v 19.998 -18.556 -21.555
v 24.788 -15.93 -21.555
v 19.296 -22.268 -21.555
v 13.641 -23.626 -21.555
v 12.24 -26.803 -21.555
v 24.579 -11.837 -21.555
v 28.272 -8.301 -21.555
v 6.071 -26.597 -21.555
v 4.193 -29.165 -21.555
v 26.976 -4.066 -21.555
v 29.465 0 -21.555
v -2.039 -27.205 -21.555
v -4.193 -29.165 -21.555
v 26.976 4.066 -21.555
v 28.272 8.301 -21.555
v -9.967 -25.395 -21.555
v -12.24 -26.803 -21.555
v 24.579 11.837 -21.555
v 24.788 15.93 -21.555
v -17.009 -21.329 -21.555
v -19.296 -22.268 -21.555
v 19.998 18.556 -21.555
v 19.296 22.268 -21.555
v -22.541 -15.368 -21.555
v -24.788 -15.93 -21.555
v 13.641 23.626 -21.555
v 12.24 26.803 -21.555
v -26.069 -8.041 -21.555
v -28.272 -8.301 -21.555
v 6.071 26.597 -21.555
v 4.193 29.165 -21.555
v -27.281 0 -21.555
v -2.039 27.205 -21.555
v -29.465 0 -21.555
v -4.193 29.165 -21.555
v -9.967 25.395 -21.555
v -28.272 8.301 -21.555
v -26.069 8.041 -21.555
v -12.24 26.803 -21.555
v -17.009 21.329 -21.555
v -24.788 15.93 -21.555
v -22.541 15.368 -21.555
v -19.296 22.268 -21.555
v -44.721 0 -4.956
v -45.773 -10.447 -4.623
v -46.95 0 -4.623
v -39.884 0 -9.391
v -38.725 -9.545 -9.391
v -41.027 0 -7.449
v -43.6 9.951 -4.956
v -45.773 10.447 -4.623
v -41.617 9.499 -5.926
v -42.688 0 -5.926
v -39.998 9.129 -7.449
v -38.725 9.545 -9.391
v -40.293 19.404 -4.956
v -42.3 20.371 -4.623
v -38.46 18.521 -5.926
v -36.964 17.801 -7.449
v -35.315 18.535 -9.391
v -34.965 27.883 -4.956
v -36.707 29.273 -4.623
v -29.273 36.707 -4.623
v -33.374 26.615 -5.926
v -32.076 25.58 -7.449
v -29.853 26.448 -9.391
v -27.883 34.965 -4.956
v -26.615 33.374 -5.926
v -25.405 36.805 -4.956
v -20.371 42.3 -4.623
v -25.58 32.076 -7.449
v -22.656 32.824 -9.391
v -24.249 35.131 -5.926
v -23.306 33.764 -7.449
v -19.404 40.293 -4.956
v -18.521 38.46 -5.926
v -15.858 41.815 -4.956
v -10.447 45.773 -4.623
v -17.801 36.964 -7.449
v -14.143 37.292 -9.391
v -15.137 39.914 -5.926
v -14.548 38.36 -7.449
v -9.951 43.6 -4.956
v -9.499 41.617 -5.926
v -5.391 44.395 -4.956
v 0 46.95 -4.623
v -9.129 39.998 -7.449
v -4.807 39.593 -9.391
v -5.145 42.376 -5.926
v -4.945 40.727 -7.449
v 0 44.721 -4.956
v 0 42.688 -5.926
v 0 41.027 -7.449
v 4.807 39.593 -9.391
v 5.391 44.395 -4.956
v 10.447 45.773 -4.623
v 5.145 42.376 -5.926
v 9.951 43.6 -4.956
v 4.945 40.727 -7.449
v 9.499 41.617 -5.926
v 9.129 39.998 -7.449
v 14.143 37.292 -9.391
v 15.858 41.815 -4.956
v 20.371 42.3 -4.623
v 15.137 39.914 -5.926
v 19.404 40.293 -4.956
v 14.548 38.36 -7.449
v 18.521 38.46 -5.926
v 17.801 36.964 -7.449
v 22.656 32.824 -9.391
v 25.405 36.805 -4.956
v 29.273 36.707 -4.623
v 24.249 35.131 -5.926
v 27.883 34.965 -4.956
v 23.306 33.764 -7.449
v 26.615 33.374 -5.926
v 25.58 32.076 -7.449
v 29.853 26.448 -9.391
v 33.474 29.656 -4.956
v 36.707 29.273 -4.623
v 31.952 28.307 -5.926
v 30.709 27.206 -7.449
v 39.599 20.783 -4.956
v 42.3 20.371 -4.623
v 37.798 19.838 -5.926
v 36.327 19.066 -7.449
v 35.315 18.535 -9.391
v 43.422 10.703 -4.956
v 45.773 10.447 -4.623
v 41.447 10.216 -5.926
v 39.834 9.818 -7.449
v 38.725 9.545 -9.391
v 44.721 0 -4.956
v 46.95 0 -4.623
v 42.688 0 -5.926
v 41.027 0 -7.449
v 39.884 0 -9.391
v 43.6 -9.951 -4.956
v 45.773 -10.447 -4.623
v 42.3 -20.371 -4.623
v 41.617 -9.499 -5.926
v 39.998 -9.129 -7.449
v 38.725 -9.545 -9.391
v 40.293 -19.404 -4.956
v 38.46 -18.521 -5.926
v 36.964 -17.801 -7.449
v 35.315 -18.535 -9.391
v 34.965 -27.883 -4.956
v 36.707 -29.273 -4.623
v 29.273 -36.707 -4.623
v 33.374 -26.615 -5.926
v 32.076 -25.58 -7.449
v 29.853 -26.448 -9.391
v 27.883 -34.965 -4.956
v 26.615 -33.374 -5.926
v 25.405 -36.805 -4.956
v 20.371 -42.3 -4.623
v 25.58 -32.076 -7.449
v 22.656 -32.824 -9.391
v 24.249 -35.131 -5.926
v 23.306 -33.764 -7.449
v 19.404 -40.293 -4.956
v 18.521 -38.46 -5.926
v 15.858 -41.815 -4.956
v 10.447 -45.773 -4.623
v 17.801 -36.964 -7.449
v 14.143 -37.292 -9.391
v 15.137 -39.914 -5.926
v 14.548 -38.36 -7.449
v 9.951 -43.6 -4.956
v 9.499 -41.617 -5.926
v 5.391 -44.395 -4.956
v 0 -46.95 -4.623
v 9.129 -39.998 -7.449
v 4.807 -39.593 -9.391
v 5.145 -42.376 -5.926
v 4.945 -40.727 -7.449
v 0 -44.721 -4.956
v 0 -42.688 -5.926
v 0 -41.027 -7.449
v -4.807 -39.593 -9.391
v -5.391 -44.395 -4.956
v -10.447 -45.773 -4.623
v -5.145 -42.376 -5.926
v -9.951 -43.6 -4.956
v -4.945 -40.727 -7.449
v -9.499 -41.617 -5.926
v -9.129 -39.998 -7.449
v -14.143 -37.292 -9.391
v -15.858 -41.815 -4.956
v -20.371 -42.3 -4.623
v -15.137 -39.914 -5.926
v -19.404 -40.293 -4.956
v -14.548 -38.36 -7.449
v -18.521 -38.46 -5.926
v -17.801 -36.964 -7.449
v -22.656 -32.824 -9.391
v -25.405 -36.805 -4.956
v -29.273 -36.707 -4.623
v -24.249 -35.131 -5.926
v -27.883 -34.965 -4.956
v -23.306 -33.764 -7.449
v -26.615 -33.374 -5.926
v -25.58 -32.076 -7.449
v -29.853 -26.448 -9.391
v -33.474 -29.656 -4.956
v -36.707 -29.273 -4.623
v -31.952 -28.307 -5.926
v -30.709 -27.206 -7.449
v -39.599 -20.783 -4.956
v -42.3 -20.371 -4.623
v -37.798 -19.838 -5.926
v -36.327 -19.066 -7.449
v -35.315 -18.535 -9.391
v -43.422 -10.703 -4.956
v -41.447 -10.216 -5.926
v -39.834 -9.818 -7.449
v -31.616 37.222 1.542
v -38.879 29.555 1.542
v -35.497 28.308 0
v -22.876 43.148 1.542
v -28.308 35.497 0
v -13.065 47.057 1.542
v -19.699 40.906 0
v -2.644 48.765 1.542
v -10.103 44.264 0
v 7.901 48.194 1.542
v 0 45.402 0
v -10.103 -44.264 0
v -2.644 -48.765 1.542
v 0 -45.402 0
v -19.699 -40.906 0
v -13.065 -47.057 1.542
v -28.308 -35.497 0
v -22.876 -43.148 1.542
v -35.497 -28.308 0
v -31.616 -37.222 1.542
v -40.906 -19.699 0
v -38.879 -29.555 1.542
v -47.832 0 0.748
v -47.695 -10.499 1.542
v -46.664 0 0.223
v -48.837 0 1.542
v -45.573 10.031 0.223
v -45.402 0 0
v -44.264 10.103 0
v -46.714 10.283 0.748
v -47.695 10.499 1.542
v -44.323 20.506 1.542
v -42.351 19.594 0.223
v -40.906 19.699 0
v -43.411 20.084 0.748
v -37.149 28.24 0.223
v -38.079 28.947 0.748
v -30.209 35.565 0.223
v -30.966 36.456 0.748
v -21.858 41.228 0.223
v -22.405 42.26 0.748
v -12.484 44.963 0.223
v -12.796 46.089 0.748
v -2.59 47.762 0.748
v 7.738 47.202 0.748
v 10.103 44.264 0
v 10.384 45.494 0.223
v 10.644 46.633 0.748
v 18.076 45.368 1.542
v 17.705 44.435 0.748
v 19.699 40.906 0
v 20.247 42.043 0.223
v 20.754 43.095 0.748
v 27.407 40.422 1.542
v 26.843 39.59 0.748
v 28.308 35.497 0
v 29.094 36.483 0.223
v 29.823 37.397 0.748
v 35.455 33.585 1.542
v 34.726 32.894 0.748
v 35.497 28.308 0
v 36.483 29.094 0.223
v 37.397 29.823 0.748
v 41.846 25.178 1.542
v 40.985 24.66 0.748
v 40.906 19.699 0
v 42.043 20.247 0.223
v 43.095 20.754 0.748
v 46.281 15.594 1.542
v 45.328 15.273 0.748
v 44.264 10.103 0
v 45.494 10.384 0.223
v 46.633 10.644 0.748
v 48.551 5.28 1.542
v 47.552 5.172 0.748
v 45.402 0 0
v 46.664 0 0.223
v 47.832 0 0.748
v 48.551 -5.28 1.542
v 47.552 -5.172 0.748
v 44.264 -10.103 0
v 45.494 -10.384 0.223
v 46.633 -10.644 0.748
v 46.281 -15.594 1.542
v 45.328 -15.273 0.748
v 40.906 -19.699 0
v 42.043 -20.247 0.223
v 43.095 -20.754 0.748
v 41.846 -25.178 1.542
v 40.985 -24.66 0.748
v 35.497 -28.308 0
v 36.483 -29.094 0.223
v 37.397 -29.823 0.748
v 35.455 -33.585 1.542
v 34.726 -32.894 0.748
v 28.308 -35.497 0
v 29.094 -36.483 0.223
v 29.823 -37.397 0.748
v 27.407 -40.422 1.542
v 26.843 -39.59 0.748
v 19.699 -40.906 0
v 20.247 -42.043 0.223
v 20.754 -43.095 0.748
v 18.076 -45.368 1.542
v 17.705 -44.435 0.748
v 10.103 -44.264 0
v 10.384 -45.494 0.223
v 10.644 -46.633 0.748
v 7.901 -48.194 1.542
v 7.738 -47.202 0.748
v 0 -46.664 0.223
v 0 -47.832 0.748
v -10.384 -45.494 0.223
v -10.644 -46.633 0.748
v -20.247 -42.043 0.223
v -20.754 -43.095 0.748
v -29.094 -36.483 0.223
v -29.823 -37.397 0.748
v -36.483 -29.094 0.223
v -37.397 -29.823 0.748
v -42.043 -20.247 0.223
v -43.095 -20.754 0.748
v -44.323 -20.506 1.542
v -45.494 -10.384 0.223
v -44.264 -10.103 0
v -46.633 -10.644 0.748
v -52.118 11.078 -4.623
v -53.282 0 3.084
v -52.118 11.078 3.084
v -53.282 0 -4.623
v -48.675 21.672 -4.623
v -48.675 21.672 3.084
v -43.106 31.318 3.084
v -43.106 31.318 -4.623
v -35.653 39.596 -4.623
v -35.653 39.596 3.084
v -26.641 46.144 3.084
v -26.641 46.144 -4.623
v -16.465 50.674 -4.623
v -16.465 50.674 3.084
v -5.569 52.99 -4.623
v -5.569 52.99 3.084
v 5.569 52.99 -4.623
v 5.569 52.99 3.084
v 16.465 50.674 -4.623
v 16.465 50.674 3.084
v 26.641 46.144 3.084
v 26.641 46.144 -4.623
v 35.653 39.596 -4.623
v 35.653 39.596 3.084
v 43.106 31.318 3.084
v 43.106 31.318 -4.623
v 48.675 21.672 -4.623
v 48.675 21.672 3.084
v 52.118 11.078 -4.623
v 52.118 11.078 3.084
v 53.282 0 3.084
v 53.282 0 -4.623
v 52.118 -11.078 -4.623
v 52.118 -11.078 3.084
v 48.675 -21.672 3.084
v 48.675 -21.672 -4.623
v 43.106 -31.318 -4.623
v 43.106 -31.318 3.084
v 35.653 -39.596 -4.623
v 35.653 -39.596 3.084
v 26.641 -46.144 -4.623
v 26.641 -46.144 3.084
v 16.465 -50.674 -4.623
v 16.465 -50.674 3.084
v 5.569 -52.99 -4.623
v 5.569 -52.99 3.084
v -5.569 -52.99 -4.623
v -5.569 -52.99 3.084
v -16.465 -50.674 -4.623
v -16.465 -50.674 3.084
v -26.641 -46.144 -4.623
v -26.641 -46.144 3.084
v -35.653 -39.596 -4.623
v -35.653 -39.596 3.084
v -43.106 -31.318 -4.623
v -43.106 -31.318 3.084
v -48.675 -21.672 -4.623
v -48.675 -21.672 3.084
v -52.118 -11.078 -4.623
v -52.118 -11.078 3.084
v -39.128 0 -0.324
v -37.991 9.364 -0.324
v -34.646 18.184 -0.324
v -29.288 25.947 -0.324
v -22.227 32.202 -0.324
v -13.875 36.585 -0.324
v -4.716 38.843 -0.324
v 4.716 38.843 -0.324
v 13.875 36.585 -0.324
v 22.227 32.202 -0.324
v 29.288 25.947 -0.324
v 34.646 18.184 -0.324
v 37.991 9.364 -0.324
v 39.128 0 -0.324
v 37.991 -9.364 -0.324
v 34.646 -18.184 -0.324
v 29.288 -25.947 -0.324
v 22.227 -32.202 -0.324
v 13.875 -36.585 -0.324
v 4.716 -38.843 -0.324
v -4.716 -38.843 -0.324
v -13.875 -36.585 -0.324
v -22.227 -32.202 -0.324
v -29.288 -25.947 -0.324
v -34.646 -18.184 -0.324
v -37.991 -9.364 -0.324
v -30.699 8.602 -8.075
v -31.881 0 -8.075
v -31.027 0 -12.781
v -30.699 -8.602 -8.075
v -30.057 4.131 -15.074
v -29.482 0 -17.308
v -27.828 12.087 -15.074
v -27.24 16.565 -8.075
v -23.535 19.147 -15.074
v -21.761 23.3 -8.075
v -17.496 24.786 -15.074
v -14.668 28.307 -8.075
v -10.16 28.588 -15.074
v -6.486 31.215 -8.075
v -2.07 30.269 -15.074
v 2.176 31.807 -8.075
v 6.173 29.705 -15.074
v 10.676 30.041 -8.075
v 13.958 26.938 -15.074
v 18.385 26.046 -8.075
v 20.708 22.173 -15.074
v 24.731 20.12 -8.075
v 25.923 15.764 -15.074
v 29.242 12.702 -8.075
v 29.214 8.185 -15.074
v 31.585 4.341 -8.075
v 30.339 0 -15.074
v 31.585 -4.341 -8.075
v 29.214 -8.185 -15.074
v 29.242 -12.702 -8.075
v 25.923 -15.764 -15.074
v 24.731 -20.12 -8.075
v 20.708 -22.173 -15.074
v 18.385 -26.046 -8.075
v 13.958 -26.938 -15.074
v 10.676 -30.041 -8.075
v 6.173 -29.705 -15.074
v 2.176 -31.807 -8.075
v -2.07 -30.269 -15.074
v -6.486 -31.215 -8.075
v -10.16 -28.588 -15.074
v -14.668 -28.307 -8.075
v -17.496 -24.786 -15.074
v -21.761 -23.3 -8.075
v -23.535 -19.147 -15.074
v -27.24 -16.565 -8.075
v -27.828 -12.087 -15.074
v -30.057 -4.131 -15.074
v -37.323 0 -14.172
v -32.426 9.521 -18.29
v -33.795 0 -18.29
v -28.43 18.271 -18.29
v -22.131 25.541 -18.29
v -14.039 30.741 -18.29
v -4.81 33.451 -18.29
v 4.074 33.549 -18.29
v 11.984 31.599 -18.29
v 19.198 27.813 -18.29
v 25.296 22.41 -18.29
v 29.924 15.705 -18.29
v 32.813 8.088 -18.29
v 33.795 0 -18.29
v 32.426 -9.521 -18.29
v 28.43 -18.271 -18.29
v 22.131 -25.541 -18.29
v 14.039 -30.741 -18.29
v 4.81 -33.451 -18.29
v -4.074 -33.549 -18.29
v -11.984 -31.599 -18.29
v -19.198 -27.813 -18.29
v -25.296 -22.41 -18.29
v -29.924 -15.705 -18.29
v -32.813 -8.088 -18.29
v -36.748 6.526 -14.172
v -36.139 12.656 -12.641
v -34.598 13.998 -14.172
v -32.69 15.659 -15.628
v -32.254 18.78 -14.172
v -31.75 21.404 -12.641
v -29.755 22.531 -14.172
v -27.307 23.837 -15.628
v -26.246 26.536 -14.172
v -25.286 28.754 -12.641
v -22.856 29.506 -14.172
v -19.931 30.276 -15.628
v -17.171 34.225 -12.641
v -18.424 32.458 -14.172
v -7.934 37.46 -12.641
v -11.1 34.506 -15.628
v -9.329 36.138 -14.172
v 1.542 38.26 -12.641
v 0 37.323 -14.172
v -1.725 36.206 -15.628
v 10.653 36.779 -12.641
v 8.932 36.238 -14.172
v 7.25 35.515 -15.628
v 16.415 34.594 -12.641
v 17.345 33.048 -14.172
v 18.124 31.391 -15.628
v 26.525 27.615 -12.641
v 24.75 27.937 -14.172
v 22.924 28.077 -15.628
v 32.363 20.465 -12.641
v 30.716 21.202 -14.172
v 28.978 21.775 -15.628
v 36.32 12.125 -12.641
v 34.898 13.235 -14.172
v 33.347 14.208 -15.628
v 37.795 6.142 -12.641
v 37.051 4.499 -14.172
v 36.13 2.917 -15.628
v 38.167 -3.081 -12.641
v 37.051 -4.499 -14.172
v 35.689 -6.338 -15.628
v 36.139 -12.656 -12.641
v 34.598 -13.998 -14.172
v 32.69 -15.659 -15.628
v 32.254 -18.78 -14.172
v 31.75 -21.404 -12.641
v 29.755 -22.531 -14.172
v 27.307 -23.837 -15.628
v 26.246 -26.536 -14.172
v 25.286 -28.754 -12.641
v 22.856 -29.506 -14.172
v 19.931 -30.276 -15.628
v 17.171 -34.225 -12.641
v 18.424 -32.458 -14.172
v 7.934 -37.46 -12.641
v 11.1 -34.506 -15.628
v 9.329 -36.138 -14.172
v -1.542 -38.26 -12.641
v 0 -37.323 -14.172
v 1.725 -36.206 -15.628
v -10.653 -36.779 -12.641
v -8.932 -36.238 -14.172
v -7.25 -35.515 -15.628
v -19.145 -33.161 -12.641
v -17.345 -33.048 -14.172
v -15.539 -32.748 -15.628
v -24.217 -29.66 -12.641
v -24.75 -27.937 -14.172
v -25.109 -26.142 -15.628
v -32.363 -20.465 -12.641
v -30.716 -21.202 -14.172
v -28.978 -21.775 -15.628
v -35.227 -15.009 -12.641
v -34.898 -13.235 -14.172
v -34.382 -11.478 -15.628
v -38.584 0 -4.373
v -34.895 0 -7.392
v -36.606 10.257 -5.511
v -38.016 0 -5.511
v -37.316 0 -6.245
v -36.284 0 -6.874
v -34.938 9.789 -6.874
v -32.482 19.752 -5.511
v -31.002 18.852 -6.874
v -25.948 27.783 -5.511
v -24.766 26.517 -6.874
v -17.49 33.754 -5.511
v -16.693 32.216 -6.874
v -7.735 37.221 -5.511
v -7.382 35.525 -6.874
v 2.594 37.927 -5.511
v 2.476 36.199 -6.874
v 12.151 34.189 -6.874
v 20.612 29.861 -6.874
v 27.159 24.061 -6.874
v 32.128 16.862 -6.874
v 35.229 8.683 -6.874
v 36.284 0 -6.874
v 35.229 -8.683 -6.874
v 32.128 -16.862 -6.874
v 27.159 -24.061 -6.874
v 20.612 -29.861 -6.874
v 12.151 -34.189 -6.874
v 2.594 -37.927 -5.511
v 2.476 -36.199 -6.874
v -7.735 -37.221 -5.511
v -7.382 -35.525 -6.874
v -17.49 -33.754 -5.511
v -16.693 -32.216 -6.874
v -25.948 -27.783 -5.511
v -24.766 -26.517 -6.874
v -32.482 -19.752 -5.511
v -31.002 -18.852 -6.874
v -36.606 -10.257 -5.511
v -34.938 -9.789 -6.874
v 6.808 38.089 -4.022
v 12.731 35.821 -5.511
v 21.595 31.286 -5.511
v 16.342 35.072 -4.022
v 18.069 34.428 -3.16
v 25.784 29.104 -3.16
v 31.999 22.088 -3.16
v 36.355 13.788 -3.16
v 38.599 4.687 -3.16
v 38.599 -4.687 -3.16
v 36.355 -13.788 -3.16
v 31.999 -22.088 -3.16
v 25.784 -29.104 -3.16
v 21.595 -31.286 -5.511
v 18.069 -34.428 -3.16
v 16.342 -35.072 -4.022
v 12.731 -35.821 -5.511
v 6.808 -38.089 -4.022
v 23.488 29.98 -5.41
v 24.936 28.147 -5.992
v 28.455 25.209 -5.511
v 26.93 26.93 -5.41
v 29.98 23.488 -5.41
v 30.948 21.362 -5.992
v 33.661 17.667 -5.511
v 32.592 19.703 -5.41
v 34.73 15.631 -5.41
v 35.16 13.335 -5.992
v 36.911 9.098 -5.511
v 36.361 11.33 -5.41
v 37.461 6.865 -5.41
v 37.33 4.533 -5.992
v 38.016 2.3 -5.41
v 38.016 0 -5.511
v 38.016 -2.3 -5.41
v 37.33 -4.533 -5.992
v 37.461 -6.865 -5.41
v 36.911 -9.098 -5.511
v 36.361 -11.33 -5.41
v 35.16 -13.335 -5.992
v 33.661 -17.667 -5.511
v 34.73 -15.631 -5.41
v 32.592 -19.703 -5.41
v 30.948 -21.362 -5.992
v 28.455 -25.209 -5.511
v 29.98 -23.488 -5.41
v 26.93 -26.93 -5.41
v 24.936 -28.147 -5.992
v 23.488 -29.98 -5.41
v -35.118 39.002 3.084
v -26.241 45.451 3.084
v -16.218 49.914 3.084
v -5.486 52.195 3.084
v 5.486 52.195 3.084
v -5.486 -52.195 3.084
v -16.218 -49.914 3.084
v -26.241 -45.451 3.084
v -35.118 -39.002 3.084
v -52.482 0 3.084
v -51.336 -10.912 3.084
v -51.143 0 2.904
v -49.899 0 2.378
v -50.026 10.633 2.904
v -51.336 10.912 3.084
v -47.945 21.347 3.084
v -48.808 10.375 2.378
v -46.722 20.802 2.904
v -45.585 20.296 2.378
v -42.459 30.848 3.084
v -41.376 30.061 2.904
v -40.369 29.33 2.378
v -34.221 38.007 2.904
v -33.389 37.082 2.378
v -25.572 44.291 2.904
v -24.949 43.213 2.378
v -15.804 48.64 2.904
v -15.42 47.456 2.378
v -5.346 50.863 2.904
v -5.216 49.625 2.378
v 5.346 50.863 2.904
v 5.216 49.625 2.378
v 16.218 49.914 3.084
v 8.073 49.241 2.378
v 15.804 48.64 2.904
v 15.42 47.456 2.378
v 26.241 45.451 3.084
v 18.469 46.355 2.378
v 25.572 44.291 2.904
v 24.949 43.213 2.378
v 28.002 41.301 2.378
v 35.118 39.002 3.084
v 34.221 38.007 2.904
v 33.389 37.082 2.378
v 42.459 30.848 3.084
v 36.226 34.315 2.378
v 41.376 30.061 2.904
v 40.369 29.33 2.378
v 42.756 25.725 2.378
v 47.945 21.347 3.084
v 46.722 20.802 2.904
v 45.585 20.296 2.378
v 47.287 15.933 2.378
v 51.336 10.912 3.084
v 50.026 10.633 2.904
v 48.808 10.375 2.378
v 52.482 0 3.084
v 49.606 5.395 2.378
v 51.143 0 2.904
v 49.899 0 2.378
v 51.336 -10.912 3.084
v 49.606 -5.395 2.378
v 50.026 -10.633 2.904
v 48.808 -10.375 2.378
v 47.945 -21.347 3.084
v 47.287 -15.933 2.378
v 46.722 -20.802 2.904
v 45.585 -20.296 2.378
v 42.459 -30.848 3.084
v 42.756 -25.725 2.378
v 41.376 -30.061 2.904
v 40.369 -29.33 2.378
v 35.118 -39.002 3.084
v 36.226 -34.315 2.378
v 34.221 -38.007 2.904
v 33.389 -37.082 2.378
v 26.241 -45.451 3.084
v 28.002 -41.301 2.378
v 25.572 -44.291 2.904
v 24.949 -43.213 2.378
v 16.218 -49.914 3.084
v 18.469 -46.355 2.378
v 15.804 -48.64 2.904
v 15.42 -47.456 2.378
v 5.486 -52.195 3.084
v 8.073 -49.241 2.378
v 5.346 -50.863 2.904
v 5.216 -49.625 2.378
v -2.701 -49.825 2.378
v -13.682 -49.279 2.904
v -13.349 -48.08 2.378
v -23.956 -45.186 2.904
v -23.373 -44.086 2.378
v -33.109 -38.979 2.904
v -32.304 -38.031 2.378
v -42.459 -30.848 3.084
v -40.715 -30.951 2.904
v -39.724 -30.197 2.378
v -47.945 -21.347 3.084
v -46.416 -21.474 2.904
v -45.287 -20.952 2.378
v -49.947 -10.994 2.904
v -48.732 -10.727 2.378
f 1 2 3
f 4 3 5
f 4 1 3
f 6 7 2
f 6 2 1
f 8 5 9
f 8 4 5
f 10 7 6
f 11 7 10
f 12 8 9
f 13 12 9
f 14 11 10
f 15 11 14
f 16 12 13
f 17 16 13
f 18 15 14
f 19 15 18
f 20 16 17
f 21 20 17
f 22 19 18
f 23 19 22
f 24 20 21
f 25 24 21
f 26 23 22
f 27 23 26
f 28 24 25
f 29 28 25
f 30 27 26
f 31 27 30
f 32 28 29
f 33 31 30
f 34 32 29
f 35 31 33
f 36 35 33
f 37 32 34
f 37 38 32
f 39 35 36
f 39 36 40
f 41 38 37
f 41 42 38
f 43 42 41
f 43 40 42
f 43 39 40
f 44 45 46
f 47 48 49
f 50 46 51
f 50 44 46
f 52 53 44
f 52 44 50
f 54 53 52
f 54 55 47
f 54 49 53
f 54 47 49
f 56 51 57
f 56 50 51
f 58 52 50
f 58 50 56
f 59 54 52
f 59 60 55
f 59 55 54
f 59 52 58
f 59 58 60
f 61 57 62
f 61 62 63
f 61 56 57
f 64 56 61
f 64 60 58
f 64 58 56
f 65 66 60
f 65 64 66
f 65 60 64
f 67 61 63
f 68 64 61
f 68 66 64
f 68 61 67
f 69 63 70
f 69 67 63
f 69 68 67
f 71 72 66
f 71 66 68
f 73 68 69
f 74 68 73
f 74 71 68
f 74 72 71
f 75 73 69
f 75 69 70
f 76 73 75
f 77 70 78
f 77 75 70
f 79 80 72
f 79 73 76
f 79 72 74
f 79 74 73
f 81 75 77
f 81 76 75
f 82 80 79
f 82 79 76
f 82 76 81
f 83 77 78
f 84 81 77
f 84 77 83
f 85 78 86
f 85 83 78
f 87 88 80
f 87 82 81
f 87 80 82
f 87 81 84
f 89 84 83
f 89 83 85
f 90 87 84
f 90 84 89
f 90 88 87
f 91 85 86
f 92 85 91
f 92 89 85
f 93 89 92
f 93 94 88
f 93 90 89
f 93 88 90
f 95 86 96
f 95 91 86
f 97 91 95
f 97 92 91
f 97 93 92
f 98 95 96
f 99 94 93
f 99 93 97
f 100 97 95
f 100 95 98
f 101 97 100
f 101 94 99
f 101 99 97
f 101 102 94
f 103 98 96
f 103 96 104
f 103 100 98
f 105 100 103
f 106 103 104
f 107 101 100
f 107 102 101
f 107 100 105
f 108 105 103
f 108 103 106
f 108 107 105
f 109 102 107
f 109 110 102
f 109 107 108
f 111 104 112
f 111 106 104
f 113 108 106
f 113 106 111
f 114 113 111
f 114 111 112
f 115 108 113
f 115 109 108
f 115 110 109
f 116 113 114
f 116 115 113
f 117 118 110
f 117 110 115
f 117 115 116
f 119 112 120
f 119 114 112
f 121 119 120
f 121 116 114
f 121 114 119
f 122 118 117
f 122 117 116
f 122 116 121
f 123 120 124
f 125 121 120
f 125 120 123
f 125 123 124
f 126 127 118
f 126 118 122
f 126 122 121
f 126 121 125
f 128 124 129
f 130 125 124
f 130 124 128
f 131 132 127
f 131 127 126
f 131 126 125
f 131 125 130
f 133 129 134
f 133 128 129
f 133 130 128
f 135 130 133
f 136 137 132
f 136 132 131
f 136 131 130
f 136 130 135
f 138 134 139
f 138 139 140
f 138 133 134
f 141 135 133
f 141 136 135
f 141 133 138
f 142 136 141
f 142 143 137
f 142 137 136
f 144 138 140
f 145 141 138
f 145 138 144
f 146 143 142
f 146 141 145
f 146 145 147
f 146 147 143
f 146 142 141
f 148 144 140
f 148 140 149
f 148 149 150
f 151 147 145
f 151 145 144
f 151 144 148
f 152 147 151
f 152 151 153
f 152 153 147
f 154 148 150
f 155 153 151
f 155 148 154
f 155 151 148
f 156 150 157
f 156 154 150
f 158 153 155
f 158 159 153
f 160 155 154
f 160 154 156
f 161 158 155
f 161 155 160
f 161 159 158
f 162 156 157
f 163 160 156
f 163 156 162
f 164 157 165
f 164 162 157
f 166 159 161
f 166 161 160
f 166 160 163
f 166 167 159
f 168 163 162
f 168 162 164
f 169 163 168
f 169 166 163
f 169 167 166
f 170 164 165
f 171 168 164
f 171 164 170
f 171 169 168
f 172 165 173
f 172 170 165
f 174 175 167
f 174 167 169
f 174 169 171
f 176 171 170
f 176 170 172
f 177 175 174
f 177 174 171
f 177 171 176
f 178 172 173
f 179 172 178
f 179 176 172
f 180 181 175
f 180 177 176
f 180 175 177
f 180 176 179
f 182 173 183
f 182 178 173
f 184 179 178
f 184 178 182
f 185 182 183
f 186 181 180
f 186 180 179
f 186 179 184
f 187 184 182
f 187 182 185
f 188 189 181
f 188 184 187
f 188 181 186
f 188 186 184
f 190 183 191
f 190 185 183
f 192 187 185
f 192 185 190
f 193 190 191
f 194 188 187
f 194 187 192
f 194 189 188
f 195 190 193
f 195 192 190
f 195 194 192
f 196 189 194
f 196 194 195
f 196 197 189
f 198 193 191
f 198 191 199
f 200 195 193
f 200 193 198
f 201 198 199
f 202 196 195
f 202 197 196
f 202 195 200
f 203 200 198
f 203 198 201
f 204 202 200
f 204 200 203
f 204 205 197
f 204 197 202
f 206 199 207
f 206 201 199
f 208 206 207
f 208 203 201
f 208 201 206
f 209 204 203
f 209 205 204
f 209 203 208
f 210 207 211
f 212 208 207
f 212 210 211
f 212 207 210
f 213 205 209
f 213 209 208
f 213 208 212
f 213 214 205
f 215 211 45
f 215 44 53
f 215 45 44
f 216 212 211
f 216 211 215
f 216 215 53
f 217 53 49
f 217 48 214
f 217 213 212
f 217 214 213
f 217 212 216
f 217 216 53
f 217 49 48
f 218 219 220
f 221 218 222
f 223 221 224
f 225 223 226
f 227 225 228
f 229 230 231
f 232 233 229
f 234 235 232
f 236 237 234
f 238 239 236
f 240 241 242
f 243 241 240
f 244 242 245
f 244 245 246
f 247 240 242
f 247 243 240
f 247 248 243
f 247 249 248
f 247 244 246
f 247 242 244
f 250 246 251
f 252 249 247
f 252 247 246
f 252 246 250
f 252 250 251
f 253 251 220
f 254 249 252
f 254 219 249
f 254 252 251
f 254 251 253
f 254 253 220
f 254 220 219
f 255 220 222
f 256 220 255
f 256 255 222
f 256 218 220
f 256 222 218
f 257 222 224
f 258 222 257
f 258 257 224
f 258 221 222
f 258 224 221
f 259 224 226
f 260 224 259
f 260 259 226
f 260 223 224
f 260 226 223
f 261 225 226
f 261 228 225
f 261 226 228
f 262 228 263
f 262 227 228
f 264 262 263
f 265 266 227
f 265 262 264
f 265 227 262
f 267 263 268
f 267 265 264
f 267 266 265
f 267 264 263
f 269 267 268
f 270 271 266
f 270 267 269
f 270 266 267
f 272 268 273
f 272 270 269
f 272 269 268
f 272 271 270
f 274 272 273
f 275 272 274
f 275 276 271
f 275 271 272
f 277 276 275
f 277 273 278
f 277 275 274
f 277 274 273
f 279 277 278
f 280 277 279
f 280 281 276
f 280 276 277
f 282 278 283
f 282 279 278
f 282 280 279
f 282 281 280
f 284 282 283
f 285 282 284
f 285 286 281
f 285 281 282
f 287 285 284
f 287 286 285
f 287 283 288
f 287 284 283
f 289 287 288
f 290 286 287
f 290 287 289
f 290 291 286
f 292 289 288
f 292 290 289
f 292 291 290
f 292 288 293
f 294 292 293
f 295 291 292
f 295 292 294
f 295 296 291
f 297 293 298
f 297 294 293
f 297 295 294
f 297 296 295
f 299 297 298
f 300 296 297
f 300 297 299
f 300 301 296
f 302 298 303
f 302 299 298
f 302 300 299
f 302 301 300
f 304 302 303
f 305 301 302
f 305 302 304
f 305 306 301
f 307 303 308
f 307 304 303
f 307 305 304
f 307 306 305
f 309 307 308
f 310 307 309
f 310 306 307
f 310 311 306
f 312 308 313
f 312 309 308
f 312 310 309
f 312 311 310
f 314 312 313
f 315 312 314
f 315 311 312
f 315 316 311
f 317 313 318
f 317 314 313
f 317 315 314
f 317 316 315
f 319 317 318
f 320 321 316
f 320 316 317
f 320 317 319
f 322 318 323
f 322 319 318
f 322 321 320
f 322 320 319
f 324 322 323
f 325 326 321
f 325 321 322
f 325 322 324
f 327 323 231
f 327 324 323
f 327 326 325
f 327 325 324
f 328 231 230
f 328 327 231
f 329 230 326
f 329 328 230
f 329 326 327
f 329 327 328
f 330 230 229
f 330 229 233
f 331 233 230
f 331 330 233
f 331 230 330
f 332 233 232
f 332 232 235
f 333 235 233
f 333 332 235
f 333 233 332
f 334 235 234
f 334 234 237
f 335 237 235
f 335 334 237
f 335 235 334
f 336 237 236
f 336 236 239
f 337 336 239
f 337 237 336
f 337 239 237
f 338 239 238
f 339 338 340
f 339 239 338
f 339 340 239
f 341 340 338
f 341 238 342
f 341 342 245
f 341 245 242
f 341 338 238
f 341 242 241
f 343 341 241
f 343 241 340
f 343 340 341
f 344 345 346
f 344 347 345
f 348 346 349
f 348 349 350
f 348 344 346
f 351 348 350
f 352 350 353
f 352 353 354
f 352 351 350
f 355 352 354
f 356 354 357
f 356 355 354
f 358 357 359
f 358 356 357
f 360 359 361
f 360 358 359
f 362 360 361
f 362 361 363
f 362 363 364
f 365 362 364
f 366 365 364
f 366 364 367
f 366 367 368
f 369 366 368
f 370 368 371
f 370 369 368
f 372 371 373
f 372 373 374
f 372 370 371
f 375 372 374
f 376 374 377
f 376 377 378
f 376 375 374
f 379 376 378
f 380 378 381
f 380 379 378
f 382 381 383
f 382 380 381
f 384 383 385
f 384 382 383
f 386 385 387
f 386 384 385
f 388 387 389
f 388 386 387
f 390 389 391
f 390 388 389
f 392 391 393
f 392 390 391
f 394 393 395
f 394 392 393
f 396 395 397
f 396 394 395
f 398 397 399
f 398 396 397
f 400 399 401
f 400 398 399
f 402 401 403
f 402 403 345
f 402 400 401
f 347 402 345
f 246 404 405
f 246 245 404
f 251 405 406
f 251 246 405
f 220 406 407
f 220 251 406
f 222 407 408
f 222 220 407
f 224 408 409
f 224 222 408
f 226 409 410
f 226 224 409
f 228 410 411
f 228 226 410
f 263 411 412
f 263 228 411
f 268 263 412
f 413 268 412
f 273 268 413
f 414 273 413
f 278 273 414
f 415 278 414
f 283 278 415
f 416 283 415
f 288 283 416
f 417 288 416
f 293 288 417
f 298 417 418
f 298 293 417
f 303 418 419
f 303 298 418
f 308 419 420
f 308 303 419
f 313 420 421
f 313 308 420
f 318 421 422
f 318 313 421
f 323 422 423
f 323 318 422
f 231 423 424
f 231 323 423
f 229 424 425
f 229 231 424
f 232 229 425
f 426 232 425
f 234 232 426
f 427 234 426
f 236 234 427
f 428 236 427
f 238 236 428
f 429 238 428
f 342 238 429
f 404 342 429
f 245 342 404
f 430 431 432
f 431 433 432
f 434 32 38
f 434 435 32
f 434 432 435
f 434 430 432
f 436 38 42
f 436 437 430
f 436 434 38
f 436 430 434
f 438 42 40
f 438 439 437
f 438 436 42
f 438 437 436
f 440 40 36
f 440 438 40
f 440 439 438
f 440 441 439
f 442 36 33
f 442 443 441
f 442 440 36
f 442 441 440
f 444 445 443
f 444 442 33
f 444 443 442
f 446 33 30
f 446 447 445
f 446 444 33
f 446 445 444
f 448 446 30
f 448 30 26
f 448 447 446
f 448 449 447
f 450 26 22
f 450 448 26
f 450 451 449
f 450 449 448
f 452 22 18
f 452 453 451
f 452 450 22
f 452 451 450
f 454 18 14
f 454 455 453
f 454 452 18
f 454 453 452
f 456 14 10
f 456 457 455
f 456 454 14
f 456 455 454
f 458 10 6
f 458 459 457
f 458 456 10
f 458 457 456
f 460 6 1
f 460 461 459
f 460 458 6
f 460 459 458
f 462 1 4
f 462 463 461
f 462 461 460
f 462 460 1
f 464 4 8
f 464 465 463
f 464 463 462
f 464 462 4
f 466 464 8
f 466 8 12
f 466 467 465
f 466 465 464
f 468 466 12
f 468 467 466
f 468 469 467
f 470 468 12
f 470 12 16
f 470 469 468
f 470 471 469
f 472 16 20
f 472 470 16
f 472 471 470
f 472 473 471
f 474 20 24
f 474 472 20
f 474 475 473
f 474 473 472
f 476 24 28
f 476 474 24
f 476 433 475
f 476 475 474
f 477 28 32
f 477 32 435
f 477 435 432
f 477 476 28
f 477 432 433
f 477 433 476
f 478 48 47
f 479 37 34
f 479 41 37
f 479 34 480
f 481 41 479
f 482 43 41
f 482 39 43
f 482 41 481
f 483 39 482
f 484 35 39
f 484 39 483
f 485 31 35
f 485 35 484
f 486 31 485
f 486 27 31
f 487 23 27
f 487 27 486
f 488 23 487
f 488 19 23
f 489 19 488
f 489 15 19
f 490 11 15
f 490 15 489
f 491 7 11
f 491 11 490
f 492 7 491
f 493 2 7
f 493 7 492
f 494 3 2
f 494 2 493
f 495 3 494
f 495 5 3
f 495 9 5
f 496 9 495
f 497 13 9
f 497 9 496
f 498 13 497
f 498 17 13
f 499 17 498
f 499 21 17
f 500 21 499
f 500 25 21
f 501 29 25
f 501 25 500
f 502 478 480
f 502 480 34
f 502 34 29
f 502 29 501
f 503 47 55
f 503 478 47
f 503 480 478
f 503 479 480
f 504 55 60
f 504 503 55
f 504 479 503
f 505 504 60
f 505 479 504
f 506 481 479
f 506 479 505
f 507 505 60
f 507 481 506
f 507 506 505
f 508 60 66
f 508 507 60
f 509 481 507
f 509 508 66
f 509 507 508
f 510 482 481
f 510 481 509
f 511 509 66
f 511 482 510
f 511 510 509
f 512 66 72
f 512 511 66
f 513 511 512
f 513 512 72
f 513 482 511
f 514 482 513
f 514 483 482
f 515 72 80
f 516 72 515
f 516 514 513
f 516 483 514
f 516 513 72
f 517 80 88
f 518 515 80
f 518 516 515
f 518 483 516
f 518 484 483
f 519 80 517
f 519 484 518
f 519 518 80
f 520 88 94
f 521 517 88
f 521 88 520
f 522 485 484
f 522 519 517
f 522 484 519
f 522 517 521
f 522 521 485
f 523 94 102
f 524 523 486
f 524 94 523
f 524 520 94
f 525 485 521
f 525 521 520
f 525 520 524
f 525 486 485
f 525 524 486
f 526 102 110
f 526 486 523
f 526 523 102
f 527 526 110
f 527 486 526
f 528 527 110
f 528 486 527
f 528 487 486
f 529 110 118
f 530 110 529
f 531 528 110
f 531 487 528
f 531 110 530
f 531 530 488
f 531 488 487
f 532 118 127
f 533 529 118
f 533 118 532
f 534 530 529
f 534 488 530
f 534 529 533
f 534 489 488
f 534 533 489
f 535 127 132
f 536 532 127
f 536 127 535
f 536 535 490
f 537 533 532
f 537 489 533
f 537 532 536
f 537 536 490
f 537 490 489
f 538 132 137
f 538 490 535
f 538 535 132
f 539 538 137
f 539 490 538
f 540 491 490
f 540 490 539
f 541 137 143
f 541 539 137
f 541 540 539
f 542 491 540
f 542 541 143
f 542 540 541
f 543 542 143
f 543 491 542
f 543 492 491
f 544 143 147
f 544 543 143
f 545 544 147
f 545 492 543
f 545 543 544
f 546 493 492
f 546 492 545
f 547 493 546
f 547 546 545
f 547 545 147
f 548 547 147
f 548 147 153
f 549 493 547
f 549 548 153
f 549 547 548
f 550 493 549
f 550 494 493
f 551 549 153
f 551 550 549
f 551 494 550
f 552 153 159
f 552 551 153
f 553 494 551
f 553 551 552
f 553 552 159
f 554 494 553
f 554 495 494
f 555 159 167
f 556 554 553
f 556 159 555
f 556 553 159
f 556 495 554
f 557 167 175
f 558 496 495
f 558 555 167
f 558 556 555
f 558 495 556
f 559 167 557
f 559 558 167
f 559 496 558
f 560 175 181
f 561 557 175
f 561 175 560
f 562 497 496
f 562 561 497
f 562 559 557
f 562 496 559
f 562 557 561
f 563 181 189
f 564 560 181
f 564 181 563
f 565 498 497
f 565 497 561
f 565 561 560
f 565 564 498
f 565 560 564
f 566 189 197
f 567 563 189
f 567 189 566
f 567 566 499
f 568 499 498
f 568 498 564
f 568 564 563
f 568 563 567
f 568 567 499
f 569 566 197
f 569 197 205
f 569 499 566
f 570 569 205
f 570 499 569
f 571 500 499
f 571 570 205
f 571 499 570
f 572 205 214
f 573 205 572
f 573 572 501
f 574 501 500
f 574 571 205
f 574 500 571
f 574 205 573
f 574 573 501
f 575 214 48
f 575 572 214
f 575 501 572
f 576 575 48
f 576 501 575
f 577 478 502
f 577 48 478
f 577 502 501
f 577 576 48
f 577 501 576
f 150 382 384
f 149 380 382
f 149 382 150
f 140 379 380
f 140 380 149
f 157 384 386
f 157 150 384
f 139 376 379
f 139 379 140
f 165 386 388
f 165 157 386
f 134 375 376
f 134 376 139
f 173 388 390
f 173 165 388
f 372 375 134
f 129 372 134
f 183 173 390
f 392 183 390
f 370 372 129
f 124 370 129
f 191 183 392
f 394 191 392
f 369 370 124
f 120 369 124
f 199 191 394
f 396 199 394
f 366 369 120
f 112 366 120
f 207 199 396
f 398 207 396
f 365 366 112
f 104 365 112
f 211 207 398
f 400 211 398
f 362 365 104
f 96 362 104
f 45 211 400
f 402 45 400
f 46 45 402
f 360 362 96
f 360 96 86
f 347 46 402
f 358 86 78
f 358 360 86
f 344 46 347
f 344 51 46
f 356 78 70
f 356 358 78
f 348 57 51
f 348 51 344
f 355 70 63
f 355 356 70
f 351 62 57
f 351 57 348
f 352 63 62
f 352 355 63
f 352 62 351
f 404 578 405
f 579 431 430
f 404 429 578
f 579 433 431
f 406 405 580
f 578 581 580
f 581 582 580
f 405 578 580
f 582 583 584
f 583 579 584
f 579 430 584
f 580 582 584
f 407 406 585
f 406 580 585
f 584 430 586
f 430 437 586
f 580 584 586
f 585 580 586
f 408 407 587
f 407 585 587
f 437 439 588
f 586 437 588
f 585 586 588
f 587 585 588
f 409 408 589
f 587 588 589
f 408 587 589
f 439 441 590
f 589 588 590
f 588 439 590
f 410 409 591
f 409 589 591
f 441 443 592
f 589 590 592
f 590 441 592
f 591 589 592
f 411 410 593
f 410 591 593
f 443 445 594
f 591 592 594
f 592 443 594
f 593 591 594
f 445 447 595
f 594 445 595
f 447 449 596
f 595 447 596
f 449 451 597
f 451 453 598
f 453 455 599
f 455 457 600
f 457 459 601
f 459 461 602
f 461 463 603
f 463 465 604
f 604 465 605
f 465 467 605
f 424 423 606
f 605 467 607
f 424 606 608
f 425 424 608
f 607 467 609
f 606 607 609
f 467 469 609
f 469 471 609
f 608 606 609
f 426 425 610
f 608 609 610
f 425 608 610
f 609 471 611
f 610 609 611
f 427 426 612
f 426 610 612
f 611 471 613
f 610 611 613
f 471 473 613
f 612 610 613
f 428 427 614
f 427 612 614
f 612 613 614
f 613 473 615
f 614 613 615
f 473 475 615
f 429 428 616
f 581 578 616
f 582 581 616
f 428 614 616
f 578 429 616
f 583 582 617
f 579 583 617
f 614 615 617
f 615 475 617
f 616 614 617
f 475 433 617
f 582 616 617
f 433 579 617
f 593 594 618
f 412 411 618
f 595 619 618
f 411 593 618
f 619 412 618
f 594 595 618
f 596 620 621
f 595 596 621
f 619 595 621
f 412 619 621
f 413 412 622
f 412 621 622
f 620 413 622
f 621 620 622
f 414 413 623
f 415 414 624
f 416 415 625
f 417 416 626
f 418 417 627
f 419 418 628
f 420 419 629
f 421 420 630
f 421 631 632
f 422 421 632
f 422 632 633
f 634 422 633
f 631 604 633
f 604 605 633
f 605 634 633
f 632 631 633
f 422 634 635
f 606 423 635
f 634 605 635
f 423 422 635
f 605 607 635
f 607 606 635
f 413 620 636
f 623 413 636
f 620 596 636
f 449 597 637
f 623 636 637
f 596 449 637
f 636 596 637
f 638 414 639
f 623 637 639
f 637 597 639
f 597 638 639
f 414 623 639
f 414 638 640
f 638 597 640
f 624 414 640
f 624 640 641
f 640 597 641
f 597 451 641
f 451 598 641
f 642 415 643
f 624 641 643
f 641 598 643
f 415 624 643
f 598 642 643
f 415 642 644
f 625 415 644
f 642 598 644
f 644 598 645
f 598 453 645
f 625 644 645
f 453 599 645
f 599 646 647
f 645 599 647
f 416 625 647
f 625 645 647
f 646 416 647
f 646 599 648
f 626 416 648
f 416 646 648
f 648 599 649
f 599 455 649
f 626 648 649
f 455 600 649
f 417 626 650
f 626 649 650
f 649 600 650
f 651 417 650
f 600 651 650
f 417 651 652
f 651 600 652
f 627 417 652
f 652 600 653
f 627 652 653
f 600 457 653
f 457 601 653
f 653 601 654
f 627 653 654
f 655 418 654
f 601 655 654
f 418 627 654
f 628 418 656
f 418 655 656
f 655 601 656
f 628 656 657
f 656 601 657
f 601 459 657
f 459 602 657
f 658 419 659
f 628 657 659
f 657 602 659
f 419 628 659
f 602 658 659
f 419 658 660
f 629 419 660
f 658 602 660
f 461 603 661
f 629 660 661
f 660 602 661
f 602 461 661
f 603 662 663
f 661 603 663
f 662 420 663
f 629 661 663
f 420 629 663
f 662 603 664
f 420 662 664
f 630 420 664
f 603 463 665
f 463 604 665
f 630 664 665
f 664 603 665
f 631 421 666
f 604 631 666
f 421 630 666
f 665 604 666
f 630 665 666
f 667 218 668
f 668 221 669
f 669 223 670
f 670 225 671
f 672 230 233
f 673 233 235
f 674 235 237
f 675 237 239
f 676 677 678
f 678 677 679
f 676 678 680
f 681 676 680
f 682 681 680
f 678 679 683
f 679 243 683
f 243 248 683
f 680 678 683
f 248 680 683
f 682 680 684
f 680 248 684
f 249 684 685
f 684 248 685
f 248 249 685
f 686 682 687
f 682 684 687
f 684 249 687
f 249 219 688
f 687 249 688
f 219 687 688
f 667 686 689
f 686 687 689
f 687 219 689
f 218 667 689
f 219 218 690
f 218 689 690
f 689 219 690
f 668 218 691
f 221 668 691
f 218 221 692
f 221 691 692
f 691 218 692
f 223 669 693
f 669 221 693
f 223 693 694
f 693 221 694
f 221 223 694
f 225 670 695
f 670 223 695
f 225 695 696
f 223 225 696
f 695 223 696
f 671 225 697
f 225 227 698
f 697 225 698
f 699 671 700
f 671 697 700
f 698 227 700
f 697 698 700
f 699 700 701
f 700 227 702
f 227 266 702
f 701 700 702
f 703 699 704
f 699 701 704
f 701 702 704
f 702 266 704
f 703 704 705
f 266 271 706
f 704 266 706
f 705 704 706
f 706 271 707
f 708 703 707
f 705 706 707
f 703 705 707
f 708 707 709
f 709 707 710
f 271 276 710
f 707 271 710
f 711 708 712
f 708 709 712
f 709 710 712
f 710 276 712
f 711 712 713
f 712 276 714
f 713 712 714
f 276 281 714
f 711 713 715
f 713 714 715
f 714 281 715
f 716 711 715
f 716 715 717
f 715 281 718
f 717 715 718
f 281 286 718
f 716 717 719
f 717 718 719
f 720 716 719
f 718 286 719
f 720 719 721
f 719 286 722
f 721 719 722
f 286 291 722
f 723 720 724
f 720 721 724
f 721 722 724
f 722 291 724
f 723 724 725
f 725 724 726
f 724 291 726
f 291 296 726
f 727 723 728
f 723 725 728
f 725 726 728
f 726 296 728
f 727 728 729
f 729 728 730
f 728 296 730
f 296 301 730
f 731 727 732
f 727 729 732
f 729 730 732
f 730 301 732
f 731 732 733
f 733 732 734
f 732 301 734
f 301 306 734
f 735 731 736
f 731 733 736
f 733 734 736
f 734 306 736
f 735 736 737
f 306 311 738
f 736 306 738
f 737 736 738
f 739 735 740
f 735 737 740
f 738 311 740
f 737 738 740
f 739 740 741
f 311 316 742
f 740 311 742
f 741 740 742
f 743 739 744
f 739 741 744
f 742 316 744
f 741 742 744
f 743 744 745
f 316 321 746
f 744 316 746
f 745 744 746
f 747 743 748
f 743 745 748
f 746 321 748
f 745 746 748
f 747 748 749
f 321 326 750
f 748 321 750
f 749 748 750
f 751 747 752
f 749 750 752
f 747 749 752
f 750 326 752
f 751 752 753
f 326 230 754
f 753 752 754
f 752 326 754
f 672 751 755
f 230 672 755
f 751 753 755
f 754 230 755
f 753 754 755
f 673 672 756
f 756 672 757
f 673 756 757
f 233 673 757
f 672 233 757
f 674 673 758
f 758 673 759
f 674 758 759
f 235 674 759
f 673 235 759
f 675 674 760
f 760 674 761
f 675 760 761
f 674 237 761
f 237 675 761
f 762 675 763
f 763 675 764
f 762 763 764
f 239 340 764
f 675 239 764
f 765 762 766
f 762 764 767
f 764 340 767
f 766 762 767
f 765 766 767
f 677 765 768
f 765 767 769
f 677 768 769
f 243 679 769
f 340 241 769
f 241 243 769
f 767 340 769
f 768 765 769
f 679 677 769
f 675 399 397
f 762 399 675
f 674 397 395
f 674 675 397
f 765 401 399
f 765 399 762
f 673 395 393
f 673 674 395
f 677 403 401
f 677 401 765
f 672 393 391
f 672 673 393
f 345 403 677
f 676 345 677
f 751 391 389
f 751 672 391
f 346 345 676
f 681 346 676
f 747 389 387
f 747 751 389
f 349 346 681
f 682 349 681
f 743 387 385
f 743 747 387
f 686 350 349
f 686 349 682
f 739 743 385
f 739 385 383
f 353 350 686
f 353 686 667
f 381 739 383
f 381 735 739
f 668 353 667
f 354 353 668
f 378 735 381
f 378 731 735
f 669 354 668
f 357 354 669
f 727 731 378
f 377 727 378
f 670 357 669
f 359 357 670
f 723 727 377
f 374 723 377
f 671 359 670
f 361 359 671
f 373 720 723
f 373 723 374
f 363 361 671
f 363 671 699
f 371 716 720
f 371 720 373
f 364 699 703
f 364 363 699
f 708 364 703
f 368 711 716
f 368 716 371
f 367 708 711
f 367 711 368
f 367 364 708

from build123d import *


# Not quite as in the source:
# - a fillet or chamfer that OpenCascade refuses, or shapes differently, is made with other operations: its cross-section is extruded or revolved along the edge and cut away or added


with BuildPart() as f1:
    # F0 (on Front) → F1 (revolve)
    with BuildSketch(Plane.XZ):
        with BuildLine():
            Line((-53.2819602912, 0), (-53.2819602912, -4.6227879951))
            Line((-53.2819602912, -4.6227879951), (-46.949992539, -4.6227879951))
            ThreePointArc((-46.949992539, -4.6227879951), (-42.687538621, -5.9264689249), (-39.883583361, -9.3914266835))
            ThreePointArc((-39.883583361, -9.3914266835), (-35.670707548, -16.3265032657), (-29.4653140008, -21.55495435))
            Line((-29.4653140008, -21.55495435), (-27.281089944, -21.55495435))
            ThreePointArc((-27.281089944, -21.55495435), (-30.3394267637, -15.0736211015), (-31.8814767831, -8.0748221676))
            add(Edge.make_bspline(
                [(-39.1281443631, -0.3240852156), (-39.0258462115, -2.415270443), (-38.815008764, -6.7252227611), (-34.2378182979, -7.6161645716), (-31.8814767831, -8.0748221676)],
                knots=[0, 0, 0, 0, 0.4851991561, 1, 1, 1, 1], degree=3))
            Line((-39.1281443631, -0.3240852156), (-45.4025, 0))
            ThreePointArc((-45.4025, 0), (-47.264175973, 0.4492875303), (-48.8369602912, 1.5420117415))
            Line((-48.8369602912, 1.5420117415), (-48.8369602912, 3.0840234831))
            Line((-48.8369602912, 3.0840234831), (-53.2819602912, 3.0840234831))
            Line((-53.2819602912, 3.0840234831), (-53.2819602912, 0))
        make_face()
    revolve(axis=Axis((0, 0, -4.7387806699), (0, 0, -1)))

    # F2: fillet of radius 5.08 on 1 edges, made by hand

    # F2_s1 → F2_t2 (revolve, cut)
    with BuildSketch(Plane.XZ):
        with BuildLine():
            ThreePointArc((-52.4823737223, 3.0840234831), (-50.5033058044, 2.6826653989), (-48.8369602912, 1.5420117415))
            Line((-48.8369602912, 1.5420117415), (-48.7640520226, 1.6127715067))
            ThreePointArc((-48.7640520226, 1.6127715067), (-48.7353602912, 2.3130176123), (-48.7353602912, 3.0840234831))
            Line((-48.7353602912, 3.0840234831), (-48.8369602912, 3.1856234831))
            Line((-48.8369602912, 3.1856234831), (-52.4823737223, 3.1856234831))
            Line((-52.4823737223, 3.1856234831), (-52.4823737223, 3.0840234831))
        make_face()
    revolve(axis=Axis((0, 0, 3.0840234831), (0, 0, -1)), mode=Mode.SUBTRACT)


solid = f1.part
